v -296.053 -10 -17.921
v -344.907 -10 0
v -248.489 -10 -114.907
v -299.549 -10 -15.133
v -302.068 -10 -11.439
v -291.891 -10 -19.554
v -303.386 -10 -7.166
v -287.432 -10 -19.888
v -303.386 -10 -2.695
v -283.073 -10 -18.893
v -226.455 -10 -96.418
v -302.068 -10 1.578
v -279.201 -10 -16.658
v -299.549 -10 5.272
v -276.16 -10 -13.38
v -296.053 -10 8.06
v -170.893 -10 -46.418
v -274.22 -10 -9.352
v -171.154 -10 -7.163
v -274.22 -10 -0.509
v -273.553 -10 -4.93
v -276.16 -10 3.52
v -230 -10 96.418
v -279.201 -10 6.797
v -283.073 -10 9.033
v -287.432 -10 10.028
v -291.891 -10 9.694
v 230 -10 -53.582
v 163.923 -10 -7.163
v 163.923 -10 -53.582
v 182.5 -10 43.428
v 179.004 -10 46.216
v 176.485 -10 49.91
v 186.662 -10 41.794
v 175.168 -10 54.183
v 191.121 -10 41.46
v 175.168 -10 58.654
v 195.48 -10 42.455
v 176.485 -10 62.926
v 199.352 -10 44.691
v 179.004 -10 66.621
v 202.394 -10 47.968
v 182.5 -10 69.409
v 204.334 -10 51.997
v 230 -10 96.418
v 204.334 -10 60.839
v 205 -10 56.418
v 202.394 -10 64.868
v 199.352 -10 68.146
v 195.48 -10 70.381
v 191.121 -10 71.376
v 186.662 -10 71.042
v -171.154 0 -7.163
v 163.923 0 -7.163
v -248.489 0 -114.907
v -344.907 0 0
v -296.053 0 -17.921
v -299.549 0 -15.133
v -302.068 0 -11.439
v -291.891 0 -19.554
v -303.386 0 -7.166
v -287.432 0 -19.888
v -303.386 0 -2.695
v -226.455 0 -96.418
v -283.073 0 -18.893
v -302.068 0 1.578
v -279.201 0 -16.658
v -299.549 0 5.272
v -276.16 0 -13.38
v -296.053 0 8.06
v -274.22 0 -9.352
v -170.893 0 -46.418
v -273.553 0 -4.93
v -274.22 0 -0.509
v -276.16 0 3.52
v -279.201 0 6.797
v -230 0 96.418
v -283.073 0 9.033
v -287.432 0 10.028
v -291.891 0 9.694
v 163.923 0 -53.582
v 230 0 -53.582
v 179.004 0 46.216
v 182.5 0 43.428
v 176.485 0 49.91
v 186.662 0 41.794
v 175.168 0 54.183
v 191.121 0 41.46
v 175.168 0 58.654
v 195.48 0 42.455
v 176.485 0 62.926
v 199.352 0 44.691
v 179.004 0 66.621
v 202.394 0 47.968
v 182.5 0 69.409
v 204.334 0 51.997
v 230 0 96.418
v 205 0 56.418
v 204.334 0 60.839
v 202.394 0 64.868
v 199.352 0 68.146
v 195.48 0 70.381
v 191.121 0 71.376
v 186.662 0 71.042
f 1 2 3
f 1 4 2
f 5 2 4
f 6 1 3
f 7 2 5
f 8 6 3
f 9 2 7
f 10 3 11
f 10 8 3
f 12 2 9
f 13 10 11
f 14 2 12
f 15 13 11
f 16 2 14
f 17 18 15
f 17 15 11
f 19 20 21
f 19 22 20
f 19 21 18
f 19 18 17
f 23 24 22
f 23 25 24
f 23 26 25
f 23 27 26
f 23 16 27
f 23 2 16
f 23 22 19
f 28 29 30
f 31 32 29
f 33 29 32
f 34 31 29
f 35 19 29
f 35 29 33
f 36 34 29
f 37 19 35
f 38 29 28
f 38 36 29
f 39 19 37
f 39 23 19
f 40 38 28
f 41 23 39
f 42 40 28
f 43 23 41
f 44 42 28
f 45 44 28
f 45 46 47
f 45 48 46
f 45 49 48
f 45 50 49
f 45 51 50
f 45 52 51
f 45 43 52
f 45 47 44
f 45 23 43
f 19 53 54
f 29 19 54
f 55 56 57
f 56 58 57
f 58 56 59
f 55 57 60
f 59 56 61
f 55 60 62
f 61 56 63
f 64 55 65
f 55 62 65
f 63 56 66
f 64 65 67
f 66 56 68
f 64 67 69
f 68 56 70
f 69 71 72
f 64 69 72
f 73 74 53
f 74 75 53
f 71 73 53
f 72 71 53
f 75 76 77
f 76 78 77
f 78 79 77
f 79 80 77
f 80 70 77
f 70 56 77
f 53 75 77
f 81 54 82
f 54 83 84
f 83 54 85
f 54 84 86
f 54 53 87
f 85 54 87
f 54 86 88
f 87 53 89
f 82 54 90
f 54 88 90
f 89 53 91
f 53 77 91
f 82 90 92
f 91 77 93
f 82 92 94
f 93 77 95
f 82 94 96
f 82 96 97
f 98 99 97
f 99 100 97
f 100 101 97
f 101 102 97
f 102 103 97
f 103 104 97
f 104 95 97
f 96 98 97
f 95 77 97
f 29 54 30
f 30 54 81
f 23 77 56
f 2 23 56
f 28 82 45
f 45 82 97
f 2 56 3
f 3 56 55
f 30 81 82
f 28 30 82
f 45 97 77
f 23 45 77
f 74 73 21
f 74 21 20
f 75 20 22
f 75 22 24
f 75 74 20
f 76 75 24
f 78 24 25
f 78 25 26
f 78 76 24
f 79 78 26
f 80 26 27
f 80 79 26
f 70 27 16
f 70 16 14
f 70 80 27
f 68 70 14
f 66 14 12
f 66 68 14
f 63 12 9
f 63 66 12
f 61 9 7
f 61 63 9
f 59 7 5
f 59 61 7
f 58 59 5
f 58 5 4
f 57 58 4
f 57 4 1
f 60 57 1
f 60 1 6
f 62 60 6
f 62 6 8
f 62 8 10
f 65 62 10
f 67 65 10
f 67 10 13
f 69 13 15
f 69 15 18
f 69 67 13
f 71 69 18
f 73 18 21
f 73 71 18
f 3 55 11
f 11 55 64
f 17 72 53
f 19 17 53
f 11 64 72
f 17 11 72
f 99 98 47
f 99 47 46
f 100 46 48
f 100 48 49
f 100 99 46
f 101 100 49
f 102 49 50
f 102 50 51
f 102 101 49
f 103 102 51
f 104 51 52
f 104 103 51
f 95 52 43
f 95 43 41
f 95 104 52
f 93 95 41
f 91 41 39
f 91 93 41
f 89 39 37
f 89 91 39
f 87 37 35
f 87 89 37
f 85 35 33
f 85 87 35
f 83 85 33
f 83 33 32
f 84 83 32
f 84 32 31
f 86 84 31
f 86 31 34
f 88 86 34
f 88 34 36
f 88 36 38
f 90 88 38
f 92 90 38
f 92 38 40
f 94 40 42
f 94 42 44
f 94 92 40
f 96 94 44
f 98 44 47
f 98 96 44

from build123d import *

# Parameters (mm, degrees)
F0_R     = 15
F1_DEPTH = 10


with BuildPart() as f1:
    # F0 (on Front) → F1 (new body)
    with BuildSketch(Plane.XZ):
        Polygon((230, -53.581859), (230, 96.418141), (-230, 96.418141), (-344.906666, 0), (-248.488525, -114.906666), (-226.454759, -96.418141), (-170.892954, -46.418141), (-171.154469, -7.162976), (163.922563, -7.162976), (163.922563, -53.581859), align=None)
        with Locations((-288.553384, -4.930273)):
            Circle(F0_R, mode=Mode.SUBTRACT)
        with Locations((190, 56.418141)):
            Circle(F0_R, mode=Mode.SUBTRACT)
    extrude(amount=F1_DEPTH)


solid = f1.part
